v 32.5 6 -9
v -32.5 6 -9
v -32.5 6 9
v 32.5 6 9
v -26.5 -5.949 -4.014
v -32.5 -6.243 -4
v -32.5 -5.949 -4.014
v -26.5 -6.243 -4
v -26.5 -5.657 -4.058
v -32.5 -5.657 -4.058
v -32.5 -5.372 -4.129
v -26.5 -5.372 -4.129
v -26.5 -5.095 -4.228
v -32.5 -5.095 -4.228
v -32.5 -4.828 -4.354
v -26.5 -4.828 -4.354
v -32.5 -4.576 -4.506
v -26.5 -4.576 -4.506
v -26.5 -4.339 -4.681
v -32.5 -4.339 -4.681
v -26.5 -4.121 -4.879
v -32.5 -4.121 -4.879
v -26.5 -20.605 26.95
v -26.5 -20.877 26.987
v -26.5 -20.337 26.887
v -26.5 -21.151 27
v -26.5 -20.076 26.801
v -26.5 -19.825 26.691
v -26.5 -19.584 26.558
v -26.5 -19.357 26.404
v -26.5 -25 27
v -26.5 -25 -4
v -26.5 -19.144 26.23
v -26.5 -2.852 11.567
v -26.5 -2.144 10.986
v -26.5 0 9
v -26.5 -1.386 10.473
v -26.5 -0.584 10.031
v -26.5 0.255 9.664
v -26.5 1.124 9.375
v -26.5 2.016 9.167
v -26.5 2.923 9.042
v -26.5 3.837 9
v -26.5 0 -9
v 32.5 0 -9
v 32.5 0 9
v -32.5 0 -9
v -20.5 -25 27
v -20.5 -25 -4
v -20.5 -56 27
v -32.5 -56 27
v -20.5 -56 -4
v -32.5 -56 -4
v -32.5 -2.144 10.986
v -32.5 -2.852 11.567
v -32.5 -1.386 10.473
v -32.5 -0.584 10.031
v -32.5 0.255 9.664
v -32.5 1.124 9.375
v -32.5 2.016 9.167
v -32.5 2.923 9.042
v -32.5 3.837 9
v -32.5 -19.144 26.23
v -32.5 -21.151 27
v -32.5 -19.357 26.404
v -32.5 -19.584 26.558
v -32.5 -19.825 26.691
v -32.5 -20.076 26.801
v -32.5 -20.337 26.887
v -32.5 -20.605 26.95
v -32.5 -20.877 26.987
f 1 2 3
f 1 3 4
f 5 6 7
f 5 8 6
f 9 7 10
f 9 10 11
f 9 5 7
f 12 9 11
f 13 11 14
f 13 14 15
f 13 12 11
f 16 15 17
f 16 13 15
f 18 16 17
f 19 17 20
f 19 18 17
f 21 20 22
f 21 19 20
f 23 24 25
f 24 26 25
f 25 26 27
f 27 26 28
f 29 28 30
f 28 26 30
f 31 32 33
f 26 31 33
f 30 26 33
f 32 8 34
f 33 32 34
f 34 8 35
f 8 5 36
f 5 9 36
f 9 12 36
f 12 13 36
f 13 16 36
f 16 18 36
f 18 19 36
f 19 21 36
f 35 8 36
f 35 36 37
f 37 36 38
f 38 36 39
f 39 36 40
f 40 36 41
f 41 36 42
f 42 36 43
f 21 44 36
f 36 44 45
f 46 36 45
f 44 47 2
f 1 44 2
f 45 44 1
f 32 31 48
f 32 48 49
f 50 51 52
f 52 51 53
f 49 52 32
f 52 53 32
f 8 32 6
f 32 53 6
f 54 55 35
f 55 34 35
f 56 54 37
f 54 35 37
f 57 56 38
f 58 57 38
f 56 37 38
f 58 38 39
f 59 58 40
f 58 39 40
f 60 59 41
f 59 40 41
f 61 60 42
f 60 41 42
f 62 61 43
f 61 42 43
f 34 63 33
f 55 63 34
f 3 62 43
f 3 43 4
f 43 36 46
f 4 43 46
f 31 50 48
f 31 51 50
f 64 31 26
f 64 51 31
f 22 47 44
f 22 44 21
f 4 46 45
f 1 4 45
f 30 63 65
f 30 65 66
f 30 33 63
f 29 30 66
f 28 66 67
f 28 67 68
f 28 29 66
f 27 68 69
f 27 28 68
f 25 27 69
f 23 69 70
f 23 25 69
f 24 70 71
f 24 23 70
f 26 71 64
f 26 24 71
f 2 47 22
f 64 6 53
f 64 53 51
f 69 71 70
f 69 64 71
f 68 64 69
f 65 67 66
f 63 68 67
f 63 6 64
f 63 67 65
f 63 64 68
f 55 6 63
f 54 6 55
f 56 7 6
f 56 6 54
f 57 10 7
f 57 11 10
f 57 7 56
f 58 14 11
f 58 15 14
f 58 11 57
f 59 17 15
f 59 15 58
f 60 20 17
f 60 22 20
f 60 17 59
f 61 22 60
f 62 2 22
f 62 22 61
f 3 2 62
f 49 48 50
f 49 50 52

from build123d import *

# Parameters (mm, degrees)
SKETCH1_W           = 65
SKETCH1_H           = 18
BOSS_EXTRUDE1_DEPTH = 6
BOSS_EXTRUDE2_DEPTH = 6
FILLET1_R           = 10
FILLET3_R           = 3
SKETCH3_W           = 31
SKETCH3_H           = 31
BOSS_EXTRUDE3_DEPTH = 6


with BuildPart() as part:
    # Sketch1 → Boss-Extrude1 (new body)
    with BuildSketch(Plane(origin=(0, 0, 0), x_dir=(1, 0, 0), z_dir=(0, 1, 0))):
        Rectangle(SKETCH1_W, SKETCH1_H)
    extrude(amount=BOSS_EXTRUDE1_DEPTH)

    # Sketch2 → Boss-Extrude2 (add)
    with BuildSketch(Plane.ZY.offset(32.5)):
        Polygon((9, 0), (-9, 0), (-4, -5), (-4, -56), (27, -56), (27, -20), align=None)
    extrude(amount=-BOSS_EXTRUDE2_DEPTH)

    # Fillet1
    fillet1_edges = [part.edges().sort_by_distance(p)[0] for p in [
        (-29.5, 0, 9),
    ]]
    fillet(fillet1_edges, radius=FILLET1_R)

    # Fillet3
    fillet3_edges = [part.edges().sort_by_distance(p)[0] for p in [
        (-29.5, -20, 27),
        (-29.5, -5, -4),
    ]]
    fillet(fillet3_edges, radius=FILLET3_R)

    # Sketch3 → Boss-Extrude3 (add)
    with BuildSketch(Plane(origin=(-26.5, 0, 0), x_dir=(0, 0, -1), z_dir=(1, 0, 0))):
        with Locations((-11.5, -40.5)):
            Rectangle(SKETCH3_W, SKETCH3_H)
    extrude(amount=BOSS_EXTRUDE3_DEPTH)


solid = part.part
